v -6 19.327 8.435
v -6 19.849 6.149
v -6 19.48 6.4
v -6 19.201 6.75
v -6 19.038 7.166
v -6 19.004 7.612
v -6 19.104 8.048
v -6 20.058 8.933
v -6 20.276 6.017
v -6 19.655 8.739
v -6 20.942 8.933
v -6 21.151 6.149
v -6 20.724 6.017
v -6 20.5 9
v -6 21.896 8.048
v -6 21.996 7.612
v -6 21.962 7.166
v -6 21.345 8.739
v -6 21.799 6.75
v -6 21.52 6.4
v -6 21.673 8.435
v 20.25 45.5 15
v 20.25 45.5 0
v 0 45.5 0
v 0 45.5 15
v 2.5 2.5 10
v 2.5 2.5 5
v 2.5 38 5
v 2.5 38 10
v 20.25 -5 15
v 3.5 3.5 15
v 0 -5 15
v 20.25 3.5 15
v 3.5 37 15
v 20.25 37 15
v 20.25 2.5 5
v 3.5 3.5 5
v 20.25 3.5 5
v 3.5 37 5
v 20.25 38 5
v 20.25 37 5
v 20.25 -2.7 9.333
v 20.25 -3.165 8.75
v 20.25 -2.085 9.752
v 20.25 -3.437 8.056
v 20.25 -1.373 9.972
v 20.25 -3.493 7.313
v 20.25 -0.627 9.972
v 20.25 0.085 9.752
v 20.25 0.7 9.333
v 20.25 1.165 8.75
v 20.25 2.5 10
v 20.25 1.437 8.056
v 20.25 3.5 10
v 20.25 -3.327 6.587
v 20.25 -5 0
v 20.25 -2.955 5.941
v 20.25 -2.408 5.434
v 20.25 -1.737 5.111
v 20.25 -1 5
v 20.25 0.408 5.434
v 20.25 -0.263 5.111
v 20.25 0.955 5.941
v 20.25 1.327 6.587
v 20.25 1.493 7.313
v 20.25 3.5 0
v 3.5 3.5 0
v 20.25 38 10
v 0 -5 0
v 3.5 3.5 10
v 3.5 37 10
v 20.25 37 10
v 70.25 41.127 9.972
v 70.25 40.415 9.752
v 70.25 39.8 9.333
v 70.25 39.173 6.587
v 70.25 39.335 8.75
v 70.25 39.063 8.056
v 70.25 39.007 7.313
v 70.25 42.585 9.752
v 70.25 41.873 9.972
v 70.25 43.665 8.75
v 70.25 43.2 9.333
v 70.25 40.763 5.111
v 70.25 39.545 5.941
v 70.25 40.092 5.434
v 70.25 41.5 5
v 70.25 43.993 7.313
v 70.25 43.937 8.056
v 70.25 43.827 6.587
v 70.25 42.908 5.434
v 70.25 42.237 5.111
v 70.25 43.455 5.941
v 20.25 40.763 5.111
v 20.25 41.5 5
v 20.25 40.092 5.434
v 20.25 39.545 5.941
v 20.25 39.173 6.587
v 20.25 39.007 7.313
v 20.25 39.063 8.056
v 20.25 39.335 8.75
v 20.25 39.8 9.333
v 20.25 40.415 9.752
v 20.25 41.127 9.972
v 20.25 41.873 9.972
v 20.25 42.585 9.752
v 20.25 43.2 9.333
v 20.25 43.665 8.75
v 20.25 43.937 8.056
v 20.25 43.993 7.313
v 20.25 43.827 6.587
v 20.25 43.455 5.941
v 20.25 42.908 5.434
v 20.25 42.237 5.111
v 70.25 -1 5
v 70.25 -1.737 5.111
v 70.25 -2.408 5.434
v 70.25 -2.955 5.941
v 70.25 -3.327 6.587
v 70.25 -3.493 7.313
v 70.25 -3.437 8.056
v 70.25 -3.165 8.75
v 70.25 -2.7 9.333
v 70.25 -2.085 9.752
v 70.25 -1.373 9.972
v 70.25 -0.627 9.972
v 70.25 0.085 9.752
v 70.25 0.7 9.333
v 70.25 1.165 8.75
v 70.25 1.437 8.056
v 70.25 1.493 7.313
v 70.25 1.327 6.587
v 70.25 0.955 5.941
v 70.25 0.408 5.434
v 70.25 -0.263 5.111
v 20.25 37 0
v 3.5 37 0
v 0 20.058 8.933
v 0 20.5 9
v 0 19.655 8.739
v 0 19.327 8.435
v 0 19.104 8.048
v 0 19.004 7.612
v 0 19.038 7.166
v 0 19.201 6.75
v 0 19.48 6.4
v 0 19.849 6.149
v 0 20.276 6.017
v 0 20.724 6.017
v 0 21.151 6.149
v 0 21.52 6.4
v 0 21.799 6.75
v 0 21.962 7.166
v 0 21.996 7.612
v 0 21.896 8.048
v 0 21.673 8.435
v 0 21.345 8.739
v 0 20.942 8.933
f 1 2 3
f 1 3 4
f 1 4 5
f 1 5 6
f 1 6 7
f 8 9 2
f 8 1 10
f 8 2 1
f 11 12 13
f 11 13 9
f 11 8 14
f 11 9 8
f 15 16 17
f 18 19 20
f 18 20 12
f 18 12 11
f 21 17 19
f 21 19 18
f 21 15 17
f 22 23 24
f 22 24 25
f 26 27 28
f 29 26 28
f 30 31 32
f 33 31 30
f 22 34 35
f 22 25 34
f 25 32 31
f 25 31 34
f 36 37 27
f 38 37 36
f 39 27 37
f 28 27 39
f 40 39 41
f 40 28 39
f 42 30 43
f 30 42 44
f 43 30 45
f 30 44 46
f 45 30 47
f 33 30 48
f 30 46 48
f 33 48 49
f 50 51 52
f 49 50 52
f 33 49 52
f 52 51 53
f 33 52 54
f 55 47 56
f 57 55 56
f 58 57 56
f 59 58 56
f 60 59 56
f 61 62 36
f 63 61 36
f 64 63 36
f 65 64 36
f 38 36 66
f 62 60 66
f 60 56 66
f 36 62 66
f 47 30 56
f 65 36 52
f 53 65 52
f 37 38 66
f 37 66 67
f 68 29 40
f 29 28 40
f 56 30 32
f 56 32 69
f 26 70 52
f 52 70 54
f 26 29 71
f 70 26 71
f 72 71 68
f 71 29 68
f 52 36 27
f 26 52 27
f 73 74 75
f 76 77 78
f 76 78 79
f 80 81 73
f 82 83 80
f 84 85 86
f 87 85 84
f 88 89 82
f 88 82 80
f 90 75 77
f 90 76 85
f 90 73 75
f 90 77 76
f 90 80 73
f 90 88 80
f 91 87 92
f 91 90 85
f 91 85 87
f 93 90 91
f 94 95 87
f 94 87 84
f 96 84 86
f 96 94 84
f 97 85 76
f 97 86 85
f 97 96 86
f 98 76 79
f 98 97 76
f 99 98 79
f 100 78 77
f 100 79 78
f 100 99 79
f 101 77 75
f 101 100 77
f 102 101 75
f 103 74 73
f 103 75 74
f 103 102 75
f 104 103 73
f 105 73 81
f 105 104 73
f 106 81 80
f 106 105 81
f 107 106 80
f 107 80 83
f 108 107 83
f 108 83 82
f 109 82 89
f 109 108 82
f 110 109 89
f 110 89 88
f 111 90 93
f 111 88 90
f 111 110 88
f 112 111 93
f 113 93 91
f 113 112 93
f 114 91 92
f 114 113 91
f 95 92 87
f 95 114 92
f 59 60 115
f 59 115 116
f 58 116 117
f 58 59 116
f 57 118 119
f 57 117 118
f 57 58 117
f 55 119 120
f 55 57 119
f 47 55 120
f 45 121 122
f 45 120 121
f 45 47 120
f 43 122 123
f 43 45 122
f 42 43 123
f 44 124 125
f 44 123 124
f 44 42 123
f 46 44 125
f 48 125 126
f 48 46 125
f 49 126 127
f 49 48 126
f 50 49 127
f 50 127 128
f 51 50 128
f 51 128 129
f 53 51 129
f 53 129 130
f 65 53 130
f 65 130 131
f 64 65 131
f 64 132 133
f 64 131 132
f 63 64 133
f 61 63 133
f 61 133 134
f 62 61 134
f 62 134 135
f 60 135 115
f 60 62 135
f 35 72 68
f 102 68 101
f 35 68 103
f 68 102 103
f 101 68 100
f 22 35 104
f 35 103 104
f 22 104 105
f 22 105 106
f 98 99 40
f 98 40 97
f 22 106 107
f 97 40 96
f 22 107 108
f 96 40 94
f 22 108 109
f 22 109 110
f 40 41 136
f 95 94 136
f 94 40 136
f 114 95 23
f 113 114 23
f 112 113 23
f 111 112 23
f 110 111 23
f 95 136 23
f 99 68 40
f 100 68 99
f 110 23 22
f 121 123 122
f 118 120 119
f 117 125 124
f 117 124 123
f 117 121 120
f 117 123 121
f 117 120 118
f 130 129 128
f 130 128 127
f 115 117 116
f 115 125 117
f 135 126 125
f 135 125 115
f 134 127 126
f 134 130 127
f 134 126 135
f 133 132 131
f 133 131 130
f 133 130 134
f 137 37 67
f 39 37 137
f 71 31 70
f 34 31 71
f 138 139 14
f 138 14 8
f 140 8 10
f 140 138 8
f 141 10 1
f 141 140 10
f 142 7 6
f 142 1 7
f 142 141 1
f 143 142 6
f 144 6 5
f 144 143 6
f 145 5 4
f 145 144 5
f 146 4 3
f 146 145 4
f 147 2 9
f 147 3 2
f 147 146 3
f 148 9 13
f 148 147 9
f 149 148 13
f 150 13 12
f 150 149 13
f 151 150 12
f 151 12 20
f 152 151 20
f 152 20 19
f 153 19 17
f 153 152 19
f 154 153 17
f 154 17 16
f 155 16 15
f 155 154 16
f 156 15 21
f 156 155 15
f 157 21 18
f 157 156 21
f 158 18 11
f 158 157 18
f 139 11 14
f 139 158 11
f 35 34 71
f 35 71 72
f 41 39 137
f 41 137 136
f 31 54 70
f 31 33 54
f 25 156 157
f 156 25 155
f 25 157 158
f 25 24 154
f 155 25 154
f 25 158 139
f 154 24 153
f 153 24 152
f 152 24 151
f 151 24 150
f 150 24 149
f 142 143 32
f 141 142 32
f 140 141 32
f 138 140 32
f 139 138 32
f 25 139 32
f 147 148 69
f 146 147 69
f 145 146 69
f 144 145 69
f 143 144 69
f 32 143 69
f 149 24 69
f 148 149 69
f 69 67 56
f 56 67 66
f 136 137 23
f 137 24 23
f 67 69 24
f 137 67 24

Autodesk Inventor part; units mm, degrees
ref_plane "YZ Plane" through (0, 0, 0) normal (1, 0, 0) x (0, 1, 0)
ref_plane "XZ Plane" through (0, 0, 0) normal (0, 1, 0) x (-1, 0, 0)
sketch "Sketch1" plane through (0, 0, 0) normal (0, 0, 1) x (1, 0, 0)
  line L0 (0, 0) -> (20.25, 0)
  line L1 (20.25, 0) -> (20.25, 40.5)
  line L2 (20.25, 40.5) -> (0, 40.5)
  line L3 (0, 40.5) -> (0, 0)
  dimension "d0" = 40.5
  dimension "d1" = 20.25
extrude "Extrusion1" add sketch "Sketch1" along normal blind 15
sketch "Sketch2" plane through (0, 0, 15) normal (0, 0, 1) x (1, 0, 0)
  line L0 (3.5, 37) -> (20.25, 37)
  line L1 (20.25, 37) -> (20.25, 3.5)
  line L2 (20.25, 3.5) -> (3.5, 3.5)
  line L3 (3.5, 3.5) -> (3.5, 37)
  line L4 (20.25, 0) -> (20.25, 40.5) projected
  line L5 (20.25, 40.5) -> (0, 40.5) projected
  line L6 (0, 0) -> (20.25, 0) projected
  dimension "d4" = 16.75
  dimension "d5" = 3.5
  dimension "d6" = 3.5
extrude "Extrusion2" cut sketch "Sketch2" against normal blind 15
ref_plane "Work Plane1" through (0, 0, 7.5) normal (0, 0, 1) x (1, 0, 0)
sketch "Sketch3" plane through (0, 0, 7.5) normal (0, 0, 1) x (1, 0, 0)
  line L0 (2.5, 38) -> (20.25, 38)
  line L1 (20.25, 38) -> (20.25, 2.5)
  line L2 (20.25, 2.5) -> (2.5, 2.5)
  line L3 (2.5, 2.5) -> (2.5, 38)
  line L4 (20.25, 0) -> (20.25, 3.5) projected
  line L5 (20.25, 40.5) -> (0, 40.5) projected
  line L6 (0, 0) -> (20.25, 0) projected
  line L7 (0, 40.5) -> (0, 0) projected
  dimension "d10" = 2.5
  dimension "d11" = 2.5
  dimension "d12" = 2.5
extrude "Extrusion3" cut sketch "Sketch3" along normal mid plane 5
sketch "Sketch4" plane through (20.25, 40.5, 15) normal (1, 0, 0) x (0, 0, -1)
  line L0 (15, 0) -> (0, 0) projected
  line L1 (0, 0) -> (15, 0)
  line L2 (15, 0) -> (15, 5)
  line L3 (15, 5) -> (0, 5)
  line L4 (0, 5) -> (0, 0)
  line L5 (15, -40.5) -> (15, -37) projected
  line L6 (15, -40.5) -> (0, -40.5)
  line L7 (0, -40.5) -> (0, -45.5)
  line L8 (0, -45.5) -> (15, -45.5)
  line L9 (15, -45.5) -> (15, -40.5)
  dimension "d15" = 5
  dimension "d16" = 5
extrude "Extrusion4" add sketch "Sketch4" against normal blind 20.25
sketch "Sketch5" plane through (0, 0, 15) normal (0, 0, 1) x (1, 0, 0)
  point P0 (0, 0)
sketch "Sketch6" plane through (20.25, 37, 10) normal (1, 0, 0) x (0, 0, -1)
  circle A0 centre (2.5, 4.5) radius 2.5
  circle A1 centre (2.5, -38) radius 2.5
  line L0 (10, 0) -> (10, 8.5) projected
  line L1 (0, 1) -> (5, 1) projected
  line L2 (10, 8.5) -> (-5, 8.5) projected
  line L3 (5, -34.5) -> (0, -34.5) projected
  point P0 (10, -37)
  dimension "d19" = 7.5
  dimension "d20" = 0
  dimension "d21" = 3.5
  dimension "d22" = 7.5
  dimension "d23" = 3.5
  dimension "d24" = 5
extrude "Extrusion5" add sketch "Sketch6" along normal blind 50
sketch "Sketch7" plane through (0, 0, 15) normal (0, 0, 1) x (1, 0, 0)
  line L0 (0, -5) -> (0, 45.5) projected
  line L1 (2.5, 2.5) -> (2.5, 38) projected
  point P0 (0, 0)
  dimension "d27" = 2.5
sketch "Sketch8" plane through (0, -5, 0) normal (-1, 0, 0) x (0, 0, 1)
  circle A0 centre (7.5, 25.5) radius 1.5
  line L0 (15, 50.5) -> (0, 50.5) projected
  line L1 (0, 0) -> (15, 0) projected
  line L2 (15, 0) -> (15, 50.5) projected
  line L3 (0, 50.5) -> (0, 0) projected
  point P0 (0, 5)
  dimension "d28" = 50.5
  dimension "d29" = 25
  dimension "d30" = 3
  dimension "d31" = 15
  dimension "d32" = 7.5
extrude "Extrusion6" add sketch "Sketch8" along normal blind 6 contours A0
properties part number "standlower"
